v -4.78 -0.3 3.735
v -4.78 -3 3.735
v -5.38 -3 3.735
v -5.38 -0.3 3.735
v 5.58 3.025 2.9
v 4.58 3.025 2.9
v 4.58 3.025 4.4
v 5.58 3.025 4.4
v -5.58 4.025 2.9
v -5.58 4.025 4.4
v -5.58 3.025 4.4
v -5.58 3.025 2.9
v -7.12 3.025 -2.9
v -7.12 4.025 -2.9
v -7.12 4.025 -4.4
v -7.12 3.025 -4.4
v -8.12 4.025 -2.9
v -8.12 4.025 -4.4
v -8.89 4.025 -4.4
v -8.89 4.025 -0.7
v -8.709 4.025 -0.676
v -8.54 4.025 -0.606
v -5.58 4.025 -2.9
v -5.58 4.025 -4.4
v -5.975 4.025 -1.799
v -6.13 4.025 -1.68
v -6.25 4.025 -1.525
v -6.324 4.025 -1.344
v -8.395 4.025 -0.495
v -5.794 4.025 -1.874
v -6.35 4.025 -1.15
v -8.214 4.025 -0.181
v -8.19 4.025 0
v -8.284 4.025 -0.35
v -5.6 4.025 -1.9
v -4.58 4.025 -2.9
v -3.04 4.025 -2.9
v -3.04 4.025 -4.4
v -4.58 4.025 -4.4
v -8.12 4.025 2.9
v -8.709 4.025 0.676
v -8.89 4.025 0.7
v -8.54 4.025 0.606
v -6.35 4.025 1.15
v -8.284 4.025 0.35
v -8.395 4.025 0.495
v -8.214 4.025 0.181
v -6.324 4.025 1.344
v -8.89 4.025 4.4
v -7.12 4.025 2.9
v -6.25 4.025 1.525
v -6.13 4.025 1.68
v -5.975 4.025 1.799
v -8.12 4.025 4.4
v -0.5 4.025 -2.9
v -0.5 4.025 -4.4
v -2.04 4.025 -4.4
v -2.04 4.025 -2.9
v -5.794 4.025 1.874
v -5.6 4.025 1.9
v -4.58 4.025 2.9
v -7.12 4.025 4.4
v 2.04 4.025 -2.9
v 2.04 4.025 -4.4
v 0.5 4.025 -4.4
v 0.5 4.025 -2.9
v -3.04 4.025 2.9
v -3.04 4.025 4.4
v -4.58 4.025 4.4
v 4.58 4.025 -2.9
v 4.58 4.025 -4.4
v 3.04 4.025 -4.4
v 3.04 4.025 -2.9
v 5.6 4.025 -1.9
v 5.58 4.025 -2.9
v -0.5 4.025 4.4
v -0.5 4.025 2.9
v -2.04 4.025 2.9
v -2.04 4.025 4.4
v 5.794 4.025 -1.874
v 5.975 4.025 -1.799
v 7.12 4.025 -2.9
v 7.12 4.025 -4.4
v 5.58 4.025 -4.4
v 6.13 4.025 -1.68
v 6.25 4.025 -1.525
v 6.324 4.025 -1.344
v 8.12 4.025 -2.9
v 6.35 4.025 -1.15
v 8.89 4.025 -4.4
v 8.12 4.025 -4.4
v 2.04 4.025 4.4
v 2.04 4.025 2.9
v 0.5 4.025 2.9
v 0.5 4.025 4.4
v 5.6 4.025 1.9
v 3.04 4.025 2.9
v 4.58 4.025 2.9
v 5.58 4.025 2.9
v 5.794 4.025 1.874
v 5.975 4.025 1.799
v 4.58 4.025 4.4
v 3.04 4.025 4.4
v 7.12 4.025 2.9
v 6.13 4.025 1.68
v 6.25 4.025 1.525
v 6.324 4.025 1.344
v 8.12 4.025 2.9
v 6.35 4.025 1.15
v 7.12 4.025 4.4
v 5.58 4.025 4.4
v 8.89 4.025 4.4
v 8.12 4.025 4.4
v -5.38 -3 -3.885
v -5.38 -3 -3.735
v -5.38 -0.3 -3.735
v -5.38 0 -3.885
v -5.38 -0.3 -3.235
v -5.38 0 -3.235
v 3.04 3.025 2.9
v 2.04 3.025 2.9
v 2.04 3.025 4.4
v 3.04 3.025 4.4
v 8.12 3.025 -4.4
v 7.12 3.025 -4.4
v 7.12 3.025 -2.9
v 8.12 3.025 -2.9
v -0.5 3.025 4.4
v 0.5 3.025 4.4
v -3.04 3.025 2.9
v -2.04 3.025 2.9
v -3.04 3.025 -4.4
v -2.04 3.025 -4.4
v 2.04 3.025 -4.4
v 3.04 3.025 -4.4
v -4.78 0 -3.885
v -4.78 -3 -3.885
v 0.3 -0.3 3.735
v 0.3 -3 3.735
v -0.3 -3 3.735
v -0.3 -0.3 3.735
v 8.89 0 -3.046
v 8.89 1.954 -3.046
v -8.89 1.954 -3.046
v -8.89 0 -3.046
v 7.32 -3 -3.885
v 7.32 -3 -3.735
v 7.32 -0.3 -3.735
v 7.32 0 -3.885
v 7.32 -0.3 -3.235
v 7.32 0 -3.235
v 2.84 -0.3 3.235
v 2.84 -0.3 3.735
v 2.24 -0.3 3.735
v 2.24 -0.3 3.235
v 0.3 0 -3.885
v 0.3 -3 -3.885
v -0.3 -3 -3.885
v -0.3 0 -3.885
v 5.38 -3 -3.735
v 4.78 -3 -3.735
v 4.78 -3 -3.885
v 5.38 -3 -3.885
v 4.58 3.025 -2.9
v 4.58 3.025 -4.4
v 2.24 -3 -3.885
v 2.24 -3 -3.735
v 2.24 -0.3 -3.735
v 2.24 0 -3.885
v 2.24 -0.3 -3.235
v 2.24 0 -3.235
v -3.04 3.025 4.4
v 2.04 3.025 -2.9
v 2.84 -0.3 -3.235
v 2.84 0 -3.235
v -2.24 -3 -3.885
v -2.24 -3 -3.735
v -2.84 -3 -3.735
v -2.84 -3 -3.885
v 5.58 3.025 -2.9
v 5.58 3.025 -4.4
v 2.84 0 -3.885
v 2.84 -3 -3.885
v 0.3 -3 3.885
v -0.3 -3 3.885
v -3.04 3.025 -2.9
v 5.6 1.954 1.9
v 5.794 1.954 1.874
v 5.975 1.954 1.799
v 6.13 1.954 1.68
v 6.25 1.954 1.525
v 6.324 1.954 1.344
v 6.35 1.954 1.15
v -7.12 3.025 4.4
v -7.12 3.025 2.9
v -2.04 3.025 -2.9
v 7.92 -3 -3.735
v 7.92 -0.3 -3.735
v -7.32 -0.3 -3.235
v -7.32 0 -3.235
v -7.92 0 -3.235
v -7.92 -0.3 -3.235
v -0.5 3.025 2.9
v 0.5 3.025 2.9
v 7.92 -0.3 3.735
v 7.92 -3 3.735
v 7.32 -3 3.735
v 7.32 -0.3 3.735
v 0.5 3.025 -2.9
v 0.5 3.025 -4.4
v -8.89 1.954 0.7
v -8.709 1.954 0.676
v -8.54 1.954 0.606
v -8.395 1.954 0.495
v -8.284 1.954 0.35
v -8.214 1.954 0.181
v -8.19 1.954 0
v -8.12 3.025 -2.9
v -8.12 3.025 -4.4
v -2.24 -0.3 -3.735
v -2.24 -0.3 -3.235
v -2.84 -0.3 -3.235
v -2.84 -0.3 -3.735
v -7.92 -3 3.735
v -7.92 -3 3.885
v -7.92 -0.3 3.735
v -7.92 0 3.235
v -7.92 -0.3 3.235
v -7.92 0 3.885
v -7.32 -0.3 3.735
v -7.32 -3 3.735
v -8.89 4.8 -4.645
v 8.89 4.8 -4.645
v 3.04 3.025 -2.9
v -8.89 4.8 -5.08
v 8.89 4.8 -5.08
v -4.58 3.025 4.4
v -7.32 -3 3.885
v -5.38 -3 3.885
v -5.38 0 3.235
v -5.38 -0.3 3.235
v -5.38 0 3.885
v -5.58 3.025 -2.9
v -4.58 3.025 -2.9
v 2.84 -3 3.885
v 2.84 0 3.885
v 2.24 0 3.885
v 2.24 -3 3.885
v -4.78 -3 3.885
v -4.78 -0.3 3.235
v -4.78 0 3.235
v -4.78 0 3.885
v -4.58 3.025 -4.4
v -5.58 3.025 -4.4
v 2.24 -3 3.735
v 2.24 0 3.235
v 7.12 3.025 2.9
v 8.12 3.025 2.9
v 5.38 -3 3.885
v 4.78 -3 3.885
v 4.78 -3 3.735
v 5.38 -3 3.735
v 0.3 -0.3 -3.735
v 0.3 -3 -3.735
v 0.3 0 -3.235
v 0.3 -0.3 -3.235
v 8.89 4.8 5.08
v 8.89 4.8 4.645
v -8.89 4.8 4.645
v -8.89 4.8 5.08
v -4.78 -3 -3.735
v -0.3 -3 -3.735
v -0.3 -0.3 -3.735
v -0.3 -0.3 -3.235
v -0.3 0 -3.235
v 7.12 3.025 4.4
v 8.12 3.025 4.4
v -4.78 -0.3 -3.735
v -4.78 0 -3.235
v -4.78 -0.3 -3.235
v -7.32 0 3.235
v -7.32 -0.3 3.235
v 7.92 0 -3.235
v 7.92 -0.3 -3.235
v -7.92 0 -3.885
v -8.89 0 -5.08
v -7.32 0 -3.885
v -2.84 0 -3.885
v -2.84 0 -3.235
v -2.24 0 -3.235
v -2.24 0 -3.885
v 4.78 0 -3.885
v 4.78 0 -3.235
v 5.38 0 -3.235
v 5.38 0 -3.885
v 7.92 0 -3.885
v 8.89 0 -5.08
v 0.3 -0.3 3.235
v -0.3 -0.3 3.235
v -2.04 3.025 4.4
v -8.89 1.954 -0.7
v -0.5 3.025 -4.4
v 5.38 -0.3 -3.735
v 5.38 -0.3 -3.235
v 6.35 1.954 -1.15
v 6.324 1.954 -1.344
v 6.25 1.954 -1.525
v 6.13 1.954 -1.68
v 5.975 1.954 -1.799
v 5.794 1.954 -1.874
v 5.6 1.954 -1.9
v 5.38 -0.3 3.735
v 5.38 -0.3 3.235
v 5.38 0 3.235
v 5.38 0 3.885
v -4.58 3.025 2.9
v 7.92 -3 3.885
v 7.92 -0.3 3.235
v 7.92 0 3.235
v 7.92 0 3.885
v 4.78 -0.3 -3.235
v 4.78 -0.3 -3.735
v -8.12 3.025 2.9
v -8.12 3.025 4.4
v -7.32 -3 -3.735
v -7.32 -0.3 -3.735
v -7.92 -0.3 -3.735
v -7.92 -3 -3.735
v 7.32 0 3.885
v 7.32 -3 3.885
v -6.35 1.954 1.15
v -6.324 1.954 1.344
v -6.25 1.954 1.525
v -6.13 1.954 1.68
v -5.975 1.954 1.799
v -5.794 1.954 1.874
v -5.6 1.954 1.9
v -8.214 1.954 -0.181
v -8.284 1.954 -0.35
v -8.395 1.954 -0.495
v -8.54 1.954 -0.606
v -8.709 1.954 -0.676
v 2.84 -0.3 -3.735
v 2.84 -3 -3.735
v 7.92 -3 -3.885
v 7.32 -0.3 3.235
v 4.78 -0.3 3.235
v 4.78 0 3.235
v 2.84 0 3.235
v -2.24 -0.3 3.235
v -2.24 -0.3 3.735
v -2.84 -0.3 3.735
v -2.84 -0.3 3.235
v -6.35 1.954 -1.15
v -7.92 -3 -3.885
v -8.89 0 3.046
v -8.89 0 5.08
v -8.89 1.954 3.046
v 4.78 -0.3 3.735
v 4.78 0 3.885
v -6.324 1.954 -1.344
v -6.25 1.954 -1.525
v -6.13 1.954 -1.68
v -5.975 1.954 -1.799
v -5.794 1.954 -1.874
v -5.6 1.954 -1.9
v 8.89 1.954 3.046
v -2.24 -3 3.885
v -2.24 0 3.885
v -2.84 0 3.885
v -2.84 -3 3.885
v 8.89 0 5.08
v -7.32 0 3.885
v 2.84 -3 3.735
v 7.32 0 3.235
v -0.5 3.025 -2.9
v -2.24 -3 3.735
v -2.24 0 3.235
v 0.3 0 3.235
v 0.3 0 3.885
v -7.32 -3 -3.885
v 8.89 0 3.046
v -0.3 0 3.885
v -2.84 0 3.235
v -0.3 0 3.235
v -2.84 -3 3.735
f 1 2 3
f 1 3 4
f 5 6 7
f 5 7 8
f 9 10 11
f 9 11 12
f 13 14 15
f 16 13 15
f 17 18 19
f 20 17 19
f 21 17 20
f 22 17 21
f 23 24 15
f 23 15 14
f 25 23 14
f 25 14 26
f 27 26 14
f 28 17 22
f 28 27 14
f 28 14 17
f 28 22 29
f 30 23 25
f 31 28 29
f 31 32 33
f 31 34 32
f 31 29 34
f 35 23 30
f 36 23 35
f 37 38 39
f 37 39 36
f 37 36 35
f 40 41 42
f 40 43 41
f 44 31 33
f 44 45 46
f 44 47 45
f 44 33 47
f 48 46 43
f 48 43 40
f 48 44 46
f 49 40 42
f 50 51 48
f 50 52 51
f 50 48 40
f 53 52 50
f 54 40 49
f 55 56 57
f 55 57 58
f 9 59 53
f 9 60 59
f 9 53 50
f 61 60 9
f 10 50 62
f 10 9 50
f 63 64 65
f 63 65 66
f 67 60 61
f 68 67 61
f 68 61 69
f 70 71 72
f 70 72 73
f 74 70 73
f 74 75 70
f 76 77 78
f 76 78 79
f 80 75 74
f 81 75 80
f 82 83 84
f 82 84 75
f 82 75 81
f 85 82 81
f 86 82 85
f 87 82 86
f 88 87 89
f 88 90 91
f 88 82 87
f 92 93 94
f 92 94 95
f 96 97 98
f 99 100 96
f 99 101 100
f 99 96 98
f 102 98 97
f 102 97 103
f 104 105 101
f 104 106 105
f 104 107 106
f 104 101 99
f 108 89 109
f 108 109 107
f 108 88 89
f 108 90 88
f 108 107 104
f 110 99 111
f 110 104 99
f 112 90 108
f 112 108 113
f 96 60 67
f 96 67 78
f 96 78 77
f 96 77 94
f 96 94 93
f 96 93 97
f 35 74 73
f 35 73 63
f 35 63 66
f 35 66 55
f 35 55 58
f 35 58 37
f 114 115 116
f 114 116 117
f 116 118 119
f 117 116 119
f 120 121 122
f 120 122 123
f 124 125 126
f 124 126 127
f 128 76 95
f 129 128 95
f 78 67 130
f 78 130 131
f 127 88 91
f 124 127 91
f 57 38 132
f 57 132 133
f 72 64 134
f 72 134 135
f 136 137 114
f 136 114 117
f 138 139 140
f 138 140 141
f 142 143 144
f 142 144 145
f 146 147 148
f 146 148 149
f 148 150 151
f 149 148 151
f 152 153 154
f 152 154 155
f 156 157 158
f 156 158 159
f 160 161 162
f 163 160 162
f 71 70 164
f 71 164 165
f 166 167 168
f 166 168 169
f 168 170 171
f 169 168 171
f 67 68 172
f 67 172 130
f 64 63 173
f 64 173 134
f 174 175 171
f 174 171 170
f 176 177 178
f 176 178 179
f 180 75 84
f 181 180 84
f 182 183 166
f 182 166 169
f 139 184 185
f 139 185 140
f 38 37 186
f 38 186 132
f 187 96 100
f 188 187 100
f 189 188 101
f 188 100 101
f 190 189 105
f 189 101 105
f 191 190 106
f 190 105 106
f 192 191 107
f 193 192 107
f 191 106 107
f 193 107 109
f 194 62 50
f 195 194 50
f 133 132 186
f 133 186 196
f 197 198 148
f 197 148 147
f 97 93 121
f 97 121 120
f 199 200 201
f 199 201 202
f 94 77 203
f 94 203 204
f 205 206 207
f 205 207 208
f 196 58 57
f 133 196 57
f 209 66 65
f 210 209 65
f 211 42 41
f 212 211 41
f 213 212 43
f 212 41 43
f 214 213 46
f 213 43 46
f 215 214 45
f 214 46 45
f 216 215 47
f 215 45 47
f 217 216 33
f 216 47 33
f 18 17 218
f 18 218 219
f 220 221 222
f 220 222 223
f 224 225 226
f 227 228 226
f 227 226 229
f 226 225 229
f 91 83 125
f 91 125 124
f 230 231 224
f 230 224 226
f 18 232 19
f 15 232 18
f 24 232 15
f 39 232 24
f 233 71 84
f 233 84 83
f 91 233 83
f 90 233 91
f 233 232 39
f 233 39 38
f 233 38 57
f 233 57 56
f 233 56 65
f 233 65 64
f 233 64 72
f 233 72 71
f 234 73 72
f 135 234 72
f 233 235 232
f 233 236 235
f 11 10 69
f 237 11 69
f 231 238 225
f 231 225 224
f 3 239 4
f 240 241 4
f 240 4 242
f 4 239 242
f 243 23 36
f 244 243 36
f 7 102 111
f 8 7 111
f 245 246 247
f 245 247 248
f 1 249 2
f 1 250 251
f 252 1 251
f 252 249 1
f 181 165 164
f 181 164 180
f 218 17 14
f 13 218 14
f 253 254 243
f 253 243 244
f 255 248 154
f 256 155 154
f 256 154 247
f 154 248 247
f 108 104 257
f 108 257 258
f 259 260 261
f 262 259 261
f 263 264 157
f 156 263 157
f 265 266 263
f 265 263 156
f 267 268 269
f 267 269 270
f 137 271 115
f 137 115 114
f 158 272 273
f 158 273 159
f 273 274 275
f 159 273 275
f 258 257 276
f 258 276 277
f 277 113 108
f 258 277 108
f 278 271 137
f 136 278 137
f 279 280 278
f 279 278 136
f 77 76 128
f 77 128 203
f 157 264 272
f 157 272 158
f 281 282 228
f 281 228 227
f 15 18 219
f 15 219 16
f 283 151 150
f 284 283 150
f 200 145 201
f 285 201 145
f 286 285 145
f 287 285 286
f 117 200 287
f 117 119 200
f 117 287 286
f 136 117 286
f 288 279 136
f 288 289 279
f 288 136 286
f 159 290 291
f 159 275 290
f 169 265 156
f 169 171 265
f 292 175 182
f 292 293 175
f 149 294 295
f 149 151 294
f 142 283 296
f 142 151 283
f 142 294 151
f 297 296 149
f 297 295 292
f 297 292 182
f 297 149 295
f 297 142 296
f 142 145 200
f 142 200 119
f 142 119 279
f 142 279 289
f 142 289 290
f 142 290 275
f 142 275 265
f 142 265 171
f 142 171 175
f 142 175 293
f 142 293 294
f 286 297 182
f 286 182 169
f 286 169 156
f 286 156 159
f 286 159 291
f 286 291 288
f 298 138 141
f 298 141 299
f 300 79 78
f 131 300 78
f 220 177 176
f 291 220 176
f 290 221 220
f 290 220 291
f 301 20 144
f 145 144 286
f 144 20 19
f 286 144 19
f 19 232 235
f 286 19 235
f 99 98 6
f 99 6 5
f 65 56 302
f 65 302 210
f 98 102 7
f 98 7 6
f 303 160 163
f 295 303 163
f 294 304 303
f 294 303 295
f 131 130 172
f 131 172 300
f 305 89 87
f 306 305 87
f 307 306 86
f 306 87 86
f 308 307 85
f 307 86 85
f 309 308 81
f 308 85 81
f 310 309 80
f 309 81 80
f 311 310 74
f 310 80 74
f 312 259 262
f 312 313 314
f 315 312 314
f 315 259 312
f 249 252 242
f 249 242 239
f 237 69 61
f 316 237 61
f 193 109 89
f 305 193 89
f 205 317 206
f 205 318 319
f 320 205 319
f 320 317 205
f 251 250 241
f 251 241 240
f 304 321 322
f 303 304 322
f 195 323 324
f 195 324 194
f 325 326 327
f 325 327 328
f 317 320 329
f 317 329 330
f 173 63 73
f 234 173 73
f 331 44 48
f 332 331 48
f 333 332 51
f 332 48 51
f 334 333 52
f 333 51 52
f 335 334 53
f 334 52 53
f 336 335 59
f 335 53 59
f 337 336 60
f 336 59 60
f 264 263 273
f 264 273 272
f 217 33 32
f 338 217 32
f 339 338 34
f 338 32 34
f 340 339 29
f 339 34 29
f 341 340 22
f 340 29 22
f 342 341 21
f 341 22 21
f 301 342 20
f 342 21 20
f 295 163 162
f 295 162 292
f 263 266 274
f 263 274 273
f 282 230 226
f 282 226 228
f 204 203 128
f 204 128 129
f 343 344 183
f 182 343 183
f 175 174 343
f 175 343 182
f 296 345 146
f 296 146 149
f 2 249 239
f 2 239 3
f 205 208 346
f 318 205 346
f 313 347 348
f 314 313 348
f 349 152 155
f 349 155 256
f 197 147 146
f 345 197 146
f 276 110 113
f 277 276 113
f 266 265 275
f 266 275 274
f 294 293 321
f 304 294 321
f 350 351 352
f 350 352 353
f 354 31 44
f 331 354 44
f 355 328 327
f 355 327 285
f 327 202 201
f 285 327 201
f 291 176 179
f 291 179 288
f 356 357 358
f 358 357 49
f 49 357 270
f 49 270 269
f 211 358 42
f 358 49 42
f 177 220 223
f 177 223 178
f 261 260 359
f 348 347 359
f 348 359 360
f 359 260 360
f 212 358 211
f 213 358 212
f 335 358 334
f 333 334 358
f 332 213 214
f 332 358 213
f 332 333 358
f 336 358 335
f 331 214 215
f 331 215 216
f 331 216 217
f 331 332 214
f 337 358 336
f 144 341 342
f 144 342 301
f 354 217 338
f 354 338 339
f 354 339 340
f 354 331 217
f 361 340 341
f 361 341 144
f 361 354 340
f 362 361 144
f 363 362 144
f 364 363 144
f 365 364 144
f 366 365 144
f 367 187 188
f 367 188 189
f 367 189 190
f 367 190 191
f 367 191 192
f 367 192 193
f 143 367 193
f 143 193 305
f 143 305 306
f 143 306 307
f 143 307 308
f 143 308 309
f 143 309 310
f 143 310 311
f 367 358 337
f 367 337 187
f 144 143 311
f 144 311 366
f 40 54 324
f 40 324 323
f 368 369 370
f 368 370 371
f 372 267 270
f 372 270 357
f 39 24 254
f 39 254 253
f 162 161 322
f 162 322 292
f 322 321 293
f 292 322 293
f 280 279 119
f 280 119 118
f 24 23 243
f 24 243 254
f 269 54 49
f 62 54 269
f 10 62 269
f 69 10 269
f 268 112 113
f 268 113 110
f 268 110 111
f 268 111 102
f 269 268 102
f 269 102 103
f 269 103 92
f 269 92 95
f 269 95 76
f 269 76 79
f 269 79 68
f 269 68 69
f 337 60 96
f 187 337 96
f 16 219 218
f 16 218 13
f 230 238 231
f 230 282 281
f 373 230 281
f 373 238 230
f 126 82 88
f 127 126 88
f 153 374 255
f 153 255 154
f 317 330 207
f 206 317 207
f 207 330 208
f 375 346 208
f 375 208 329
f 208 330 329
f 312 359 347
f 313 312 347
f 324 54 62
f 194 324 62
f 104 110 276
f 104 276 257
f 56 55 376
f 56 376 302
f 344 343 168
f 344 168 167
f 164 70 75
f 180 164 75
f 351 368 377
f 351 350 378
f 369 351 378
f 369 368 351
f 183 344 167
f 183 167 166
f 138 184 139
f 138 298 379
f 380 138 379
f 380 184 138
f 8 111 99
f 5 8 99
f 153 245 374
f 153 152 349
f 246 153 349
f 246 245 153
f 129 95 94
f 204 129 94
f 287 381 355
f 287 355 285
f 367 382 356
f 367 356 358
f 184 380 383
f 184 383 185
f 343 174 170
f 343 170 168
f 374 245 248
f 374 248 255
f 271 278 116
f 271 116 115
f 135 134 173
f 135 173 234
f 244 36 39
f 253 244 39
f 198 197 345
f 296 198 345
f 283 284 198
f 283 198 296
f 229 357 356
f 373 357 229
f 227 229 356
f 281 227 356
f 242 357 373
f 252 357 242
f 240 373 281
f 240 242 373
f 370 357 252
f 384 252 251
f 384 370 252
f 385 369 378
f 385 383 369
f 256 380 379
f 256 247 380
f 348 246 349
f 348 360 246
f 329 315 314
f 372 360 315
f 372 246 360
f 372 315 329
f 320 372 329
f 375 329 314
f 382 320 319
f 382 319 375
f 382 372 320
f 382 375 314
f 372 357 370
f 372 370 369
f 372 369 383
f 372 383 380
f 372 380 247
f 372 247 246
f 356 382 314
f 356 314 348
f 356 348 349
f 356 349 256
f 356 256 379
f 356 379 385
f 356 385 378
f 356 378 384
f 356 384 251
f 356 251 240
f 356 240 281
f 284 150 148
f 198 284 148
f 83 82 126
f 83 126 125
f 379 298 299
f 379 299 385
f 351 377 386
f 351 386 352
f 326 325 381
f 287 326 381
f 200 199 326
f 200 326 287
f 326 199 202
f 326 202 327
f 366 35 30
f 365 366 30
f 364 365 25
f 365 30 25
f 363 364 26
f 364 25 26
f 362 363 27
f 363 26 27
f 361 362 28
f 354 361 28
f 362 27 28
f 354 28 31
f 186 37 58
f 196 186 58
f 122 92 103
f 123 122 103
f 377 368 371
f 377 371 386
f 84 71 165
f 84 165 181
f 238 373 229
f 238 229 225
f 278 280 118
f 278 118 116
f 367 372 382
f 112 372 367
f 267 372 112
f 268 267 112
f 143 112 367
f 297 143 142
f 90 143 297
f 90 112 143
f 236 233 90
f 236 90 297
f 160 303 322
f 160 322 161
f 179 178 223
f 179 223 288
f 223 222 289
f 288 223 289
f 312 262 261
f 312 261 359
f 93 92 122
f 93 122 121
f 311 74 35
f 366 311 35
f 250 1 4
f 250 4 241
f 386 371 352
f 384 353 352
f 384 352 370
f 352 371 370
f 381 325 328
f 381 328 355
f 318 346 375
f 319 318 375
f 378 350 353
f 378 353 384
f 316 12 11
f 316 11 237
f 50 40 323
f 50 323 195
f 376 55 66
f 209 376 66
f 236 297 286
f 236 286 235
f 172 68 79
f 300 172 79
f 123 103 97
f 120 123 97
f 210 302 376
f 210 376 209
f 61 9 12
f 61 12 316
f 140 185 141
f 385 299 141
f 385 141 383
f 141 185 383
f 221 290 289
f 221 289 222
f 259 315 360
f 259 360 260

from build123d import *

# Parameters (mm, degrees)
EXTRUDE_1_DEPTH     = 8.89
CUT_EXTRUDE_1_REACH = 14.417
CUT_EXTRUDE_2_REACH = 14.417
SKETCH_3_4_W        = 1
SKETCH_3_4_H        = 1.5
CUT_EXTRUDE_3_DEPTH = 1
SKETCH_4_W          = 0.97
SKETCH_4_H          = 3
SKETCH_4_W_2        = 1.94
CUT_EXTRUDE_4_DEPTH = 14.507158287


with BuildPart() as part:
    # Эскиз2 → Бобышка-Вытянуть1 (new, symmetric)
    with BuildSketch(Plane(origin=(0, 0, 0), x_dir=(0, 0, -1), z_dir=(1, 0, 0))):
        Polygon((4.399571873, 4.024999392), (-4.399571873, 4.024999392), (-4.64484088, 4.8), (-5.08, 4.8), (-5.08, 0), (-3.885, 0), (-3.885, -3), (-3.735, -3), (-3.735, -0.3), (-3.235, -0.3), (-3.235, 0), (-3.045579843, 0), (-3.045579843, 1.95423056), (3.045579843, 1.95423056), (3.045579843, 0), (3.235, 0), (3.235, -0.3), (3.735, -0.3), (3.735, -3), (3.885, -3), (3.885, 0), (5.08, 0), (5.08, 4.8), (4.64484088, 4.8), align=None)
    extrude(amount=EXTRUDE_1_DEPTH, both=True)

    # Эскиз3 → Вырез-Вытянуть1 (cut, up to next)
    with BuildSketch(Plane(origin=(0, 4.024999392, 0), x_dir=(1, 0, 0), z_dir=(0, 1, 0)), mode=Mode.PRIVATE) as cut_extrude_1_sk1:
        with BuildLine():
            Line((-8.89, 0.7), (-8.89, 0))
            Line((-8.89, 0), (-8.19, 0))
            ThreePointArc((-8.19, 0), (-8.395025253, 0.494974747), (-8.89, 0.7))
        make_face()
    cut_extrude_1_tool1 = extrude(cut_extrude_1_sk1.sketch, amount=-CUT_EXTRUDE_1_REACH, mode=Mode.PRIVATE) & part.part
    # Эскиз3 → Вырез-Вытянуть1 (cut, up to next)
    with BuildSketch(Plane(origin=(0, 4.024999392, 0), x_dir=(1, 0, 0), z_dir=(0, 1, 0)), mode=Mode.PRIVATE) as cut_extrude_1_sk2:
        with BuildLine():
            Line((-8.19, 0), (-8.89, 0))
            Line((-8.89, 0), (-8.89, -0.7))
            ThreePointArc((-8.89, -0.7), (-8.395025253, -0.494974747), (-8.19, 0))
        make_face()
    cut_extrude_1_tool2 = extrude(cut_extrude_1_sk2.sketch, amount=-CUT_EXTRUDE_1_REACH, mode=Mode.PRIVATE) & part.part
    # Эскиз3 → Вырез-Вытянуть1 (cut, up to next)
    with BuildSketch(Plane(origin=(0, 4.024999392, 0), x_dir=(1, 0, 0), z_dir=(0, 1, 0)), mode=Mode.PRIVATE) as cut_extrude_1_sk3:
        with BuildLine():
            Line((-8.89, 0.7), (-8.89, 0))
            Line((-8.89, 0), (-8.19, 0))
            ThreePointArc((-8.19, 0), (-8.395025253, 0.494974747), (-8.89, 0.7))
        make_face()
    cut_extrude_1_tool3 = extrude(cut_extrude_1_sk3.sketch, amount=-CUT_EXTRUDE_1_REACH, mode=Mode.PRIVATE) & part.part
    # Эскиз3 → Вырез-Вытянуть1 (cut, up to next)
    with BuildSketch(Plane(origin=(0, 4.024999392, 0), x_dir=(1, 0, 0), z_dir=(0, 1, 0)), mode=Mode.PRIVATE) as cut_extrude_1_sk4:
        with BuildLine():
            Line((-8.19, 0), (-8.89, 0))
            Line((-8.89, 0), (-8.89, -0.7))
            ThreePointArc((-8.89, -0.7), (-8.395025253, -0.494974747), (-8.19, 0))
        make_face()
    cut_extrude_1_tool4 = extrude(cut_extrude_1_sk4.sketch, amount=-CUT_EXTRUDE_1_REACH, mode=Mode.PRIVATE) & part.part
    add(cut_extrude_1_tool1.solids().sort_by_distance((-8.592911, 4.024999, -0.297089))[0], mode=Mode.SUBTRACT)
    add(cut_extrude_1_tool2.solids().sort_by_distance((-8.592911, 4.024999, 0.297089))[0], mode=Mode.SUBTRACT)
    add(cut_extrude_1_tool3.solids().sort_by_distance((-8.592911, 4.024999, -0.297089))[0], mode=Mode.SUBTRACT)
    add(cut_extrude_1_tool4.solids().sort_by_distance((-8.592911, 4.024999, 0.297089))[0], mode=Mode.SUBTRACT)

    # Эскиз3<3> → Вырез-Вытянуть2 (cut, up to next)
    with BuildSketch(Plane(origin=(0, 4.024999392, 0), x_dir=(1, 0, 0), z_dir=(0, 1, 0)), mode=Mode.PRIVATE) as cut_extrude_2_sk1:
        with BuildLine():
            Line((6.35, 0), (-6.35, 0))
            Line((-6.35, 0), (-6.35, -1.149571873))
            ThreePointArc((-6.35, -1.149571873), (-6.130330086, -1.679901959), (-5.6, -1.899571873))
            Line((-5.6, -1.899571873), (5.6, -1.899571873))
            ThreePointArc((5.6, -1.899571873), (6.130330086, -1.679901959), (6.35, -1.149571873))
            Line((6.35, -1.149571873), (6.35, 0))
        make_face()
    cut_extrude_2_tool1 = extrude(cut_extrude_2_sk1.sketch, amount=-CUT_EXTRUDE_2_REACH, mode=Mode.PRIVATE) & part.part
    # Эскиз3<3> → Вырез-Вытянуть2 (cut, up to next)
    with BuildSketch(Plane(origin=(0, 4.024999392, 0), x_dir=(1, 0, 0), z_dir=(0, 1, 0)), mode=Mode.PRIVATE) as cut_extrude_2_sk2:
        with BuildLine():
            Line((-6.35, 1.149571873), (-6.35, 0))
            Line((-6.35, 0), (6.35, 0))
            Line((6.35, 0), (6.35, 1.149571873))
            ThreePointArc((6.35, 1.149571873), (6.130330086, 1.679901959), (5.6, 1.899571873))
            Line((5.6, 1.899571873), (-5.6, 1.899571873))
            ThreePointArc((-5.6, 1.899571873), (-6.130330086, 1.679901959), (-6.35, 1.149571873))
        make_face()
    cut_extrude_2_tool2 = extrude(cut_extrude_2_sk2.sketch, amount=-CUT_EXTRUDE_2_REACH, mode=Mode.PRIVATE) & part.part
    add(cut_extrude_2_tool1.solids().sort_by_distance((0, 4.024999, 0.941878))[0], mode=Mode.SUBTRACT)
    add(cut_extrude_2_tool2.solids().sort_by_distance((0, 4.024999, -0.941878))[0], mode=Mode.SUBTRACT)

    # Эскиз3<4> → Вырез-Вытянуть3 (cut)
    with BuildSketch(Plane(origin=(0, 4.024999392, 0), x_dir=(1, 0, 0), z_dir=(0, 1, 0))):
        with Locations((-7.62, 3.649571873)):
            Rectangle(SKETCH_3_4_W, SKETCH_3_4_H)
        with Locations((-5.08, 3.649571873)):
            Rectangle(SKETCH_3_4_W, SKETCH_3_4_H)
        with Locations((-2.54, 3.649571873)):
            Rectangle(SKETCH_3_4_W, SKETCH_3_4_H)
        with Locations((0, 3.649571873)):
            Rectangle(SKETCH_3_4_W, SKETCH_3_4_H)
        with Locations((2.54, 3.649571873)):
            Rectangle(SKETCH_3_4_W, SKETCH_3_4_H)
        with Locations((5.08, 3.649571873)):
            Rectangle(SKETCH_3_4_W, SKETCH_3_4_H)
        with Locations((7.62, 3.649571873)):
            Rectangle(SKETCH_3_4_W, SKETCH_3_4_H)
        with Locations((7.62, -3.649571873)):
            Rectangle(SKETCH_3_4_W, SKETCH_3_4_H)
        with Locations((5.08, -3.649571873)):
            Rectangle(SKETCH_3_4_W, SKETCH_3_4_H)
        with Locations((2.54, -3.649571873)):
            Rectangle(SKETCH_3_4_W, SKETCH_3_4_H)
        with Locations((0, -3.649571873)):
            Rectangle(SKETCH_3_4_W, SKETCH_3_4_H)
        with Locations((-2.54, -3.649571873)):
            Rectangle(SKETCH_3_4_W, SKETCH_3_4_H)
        with Locations((-5.08, -3.649571873)):
            Rectangle(SKETCH_3_4_W, SKETCH_3_4_H)
        with Locations((-7.62, -3.649571873)):
            Rectangle(SKETCH_3_4_W, SKETCH_3_4_H)
    extrude(amount=-CUT_EXTRUDE_3_DEPTH, mode=Mode.SUBTRACT)

    # Эскиз4 → Вырез-Вытянуть4 (cut, through all)
    with BuildSketch(Plane.XY.offset(3.885)):
        with Locations((-8.405, -1.5)):
            Rectangle(SKETCH_4_W, SKETCH_4_H)
        with Locations((-6.35, -1.5)):
            Rectangle(SKETCH_4_W_2, SKETCH_4_H)
        with Locations((-3.81, -1.5)):
            Rectangle(SKETCH_4_W_2, SKETCH_4_H)
        with Locations((-1.27, -1.5)):
            Rectangle(SKETCH_4_W_2, SKETCH_4_H)
        with Locations((1.27, -1.5)):
            Rectangle(SKETCH_4_W_2, SKETCH_4_H)
        with Locations((3.81, -1.5)):
            Rectangle(SKETCH_4_W_2, SKETCH_4_H)
        with Locations((6.35, -1.5)):
            Rectangle(SKETCH_4_W_2, SKETCH_4_H)
        with Locations((8.405, -1.5)):
            Rectangle(SKETCH_4_W, SKETCH_4_H)
    extrude(amount=-CUT_EXTRUDE_4_DEPTH, mode=Mode.SUBTRACT)


solid = part.part
